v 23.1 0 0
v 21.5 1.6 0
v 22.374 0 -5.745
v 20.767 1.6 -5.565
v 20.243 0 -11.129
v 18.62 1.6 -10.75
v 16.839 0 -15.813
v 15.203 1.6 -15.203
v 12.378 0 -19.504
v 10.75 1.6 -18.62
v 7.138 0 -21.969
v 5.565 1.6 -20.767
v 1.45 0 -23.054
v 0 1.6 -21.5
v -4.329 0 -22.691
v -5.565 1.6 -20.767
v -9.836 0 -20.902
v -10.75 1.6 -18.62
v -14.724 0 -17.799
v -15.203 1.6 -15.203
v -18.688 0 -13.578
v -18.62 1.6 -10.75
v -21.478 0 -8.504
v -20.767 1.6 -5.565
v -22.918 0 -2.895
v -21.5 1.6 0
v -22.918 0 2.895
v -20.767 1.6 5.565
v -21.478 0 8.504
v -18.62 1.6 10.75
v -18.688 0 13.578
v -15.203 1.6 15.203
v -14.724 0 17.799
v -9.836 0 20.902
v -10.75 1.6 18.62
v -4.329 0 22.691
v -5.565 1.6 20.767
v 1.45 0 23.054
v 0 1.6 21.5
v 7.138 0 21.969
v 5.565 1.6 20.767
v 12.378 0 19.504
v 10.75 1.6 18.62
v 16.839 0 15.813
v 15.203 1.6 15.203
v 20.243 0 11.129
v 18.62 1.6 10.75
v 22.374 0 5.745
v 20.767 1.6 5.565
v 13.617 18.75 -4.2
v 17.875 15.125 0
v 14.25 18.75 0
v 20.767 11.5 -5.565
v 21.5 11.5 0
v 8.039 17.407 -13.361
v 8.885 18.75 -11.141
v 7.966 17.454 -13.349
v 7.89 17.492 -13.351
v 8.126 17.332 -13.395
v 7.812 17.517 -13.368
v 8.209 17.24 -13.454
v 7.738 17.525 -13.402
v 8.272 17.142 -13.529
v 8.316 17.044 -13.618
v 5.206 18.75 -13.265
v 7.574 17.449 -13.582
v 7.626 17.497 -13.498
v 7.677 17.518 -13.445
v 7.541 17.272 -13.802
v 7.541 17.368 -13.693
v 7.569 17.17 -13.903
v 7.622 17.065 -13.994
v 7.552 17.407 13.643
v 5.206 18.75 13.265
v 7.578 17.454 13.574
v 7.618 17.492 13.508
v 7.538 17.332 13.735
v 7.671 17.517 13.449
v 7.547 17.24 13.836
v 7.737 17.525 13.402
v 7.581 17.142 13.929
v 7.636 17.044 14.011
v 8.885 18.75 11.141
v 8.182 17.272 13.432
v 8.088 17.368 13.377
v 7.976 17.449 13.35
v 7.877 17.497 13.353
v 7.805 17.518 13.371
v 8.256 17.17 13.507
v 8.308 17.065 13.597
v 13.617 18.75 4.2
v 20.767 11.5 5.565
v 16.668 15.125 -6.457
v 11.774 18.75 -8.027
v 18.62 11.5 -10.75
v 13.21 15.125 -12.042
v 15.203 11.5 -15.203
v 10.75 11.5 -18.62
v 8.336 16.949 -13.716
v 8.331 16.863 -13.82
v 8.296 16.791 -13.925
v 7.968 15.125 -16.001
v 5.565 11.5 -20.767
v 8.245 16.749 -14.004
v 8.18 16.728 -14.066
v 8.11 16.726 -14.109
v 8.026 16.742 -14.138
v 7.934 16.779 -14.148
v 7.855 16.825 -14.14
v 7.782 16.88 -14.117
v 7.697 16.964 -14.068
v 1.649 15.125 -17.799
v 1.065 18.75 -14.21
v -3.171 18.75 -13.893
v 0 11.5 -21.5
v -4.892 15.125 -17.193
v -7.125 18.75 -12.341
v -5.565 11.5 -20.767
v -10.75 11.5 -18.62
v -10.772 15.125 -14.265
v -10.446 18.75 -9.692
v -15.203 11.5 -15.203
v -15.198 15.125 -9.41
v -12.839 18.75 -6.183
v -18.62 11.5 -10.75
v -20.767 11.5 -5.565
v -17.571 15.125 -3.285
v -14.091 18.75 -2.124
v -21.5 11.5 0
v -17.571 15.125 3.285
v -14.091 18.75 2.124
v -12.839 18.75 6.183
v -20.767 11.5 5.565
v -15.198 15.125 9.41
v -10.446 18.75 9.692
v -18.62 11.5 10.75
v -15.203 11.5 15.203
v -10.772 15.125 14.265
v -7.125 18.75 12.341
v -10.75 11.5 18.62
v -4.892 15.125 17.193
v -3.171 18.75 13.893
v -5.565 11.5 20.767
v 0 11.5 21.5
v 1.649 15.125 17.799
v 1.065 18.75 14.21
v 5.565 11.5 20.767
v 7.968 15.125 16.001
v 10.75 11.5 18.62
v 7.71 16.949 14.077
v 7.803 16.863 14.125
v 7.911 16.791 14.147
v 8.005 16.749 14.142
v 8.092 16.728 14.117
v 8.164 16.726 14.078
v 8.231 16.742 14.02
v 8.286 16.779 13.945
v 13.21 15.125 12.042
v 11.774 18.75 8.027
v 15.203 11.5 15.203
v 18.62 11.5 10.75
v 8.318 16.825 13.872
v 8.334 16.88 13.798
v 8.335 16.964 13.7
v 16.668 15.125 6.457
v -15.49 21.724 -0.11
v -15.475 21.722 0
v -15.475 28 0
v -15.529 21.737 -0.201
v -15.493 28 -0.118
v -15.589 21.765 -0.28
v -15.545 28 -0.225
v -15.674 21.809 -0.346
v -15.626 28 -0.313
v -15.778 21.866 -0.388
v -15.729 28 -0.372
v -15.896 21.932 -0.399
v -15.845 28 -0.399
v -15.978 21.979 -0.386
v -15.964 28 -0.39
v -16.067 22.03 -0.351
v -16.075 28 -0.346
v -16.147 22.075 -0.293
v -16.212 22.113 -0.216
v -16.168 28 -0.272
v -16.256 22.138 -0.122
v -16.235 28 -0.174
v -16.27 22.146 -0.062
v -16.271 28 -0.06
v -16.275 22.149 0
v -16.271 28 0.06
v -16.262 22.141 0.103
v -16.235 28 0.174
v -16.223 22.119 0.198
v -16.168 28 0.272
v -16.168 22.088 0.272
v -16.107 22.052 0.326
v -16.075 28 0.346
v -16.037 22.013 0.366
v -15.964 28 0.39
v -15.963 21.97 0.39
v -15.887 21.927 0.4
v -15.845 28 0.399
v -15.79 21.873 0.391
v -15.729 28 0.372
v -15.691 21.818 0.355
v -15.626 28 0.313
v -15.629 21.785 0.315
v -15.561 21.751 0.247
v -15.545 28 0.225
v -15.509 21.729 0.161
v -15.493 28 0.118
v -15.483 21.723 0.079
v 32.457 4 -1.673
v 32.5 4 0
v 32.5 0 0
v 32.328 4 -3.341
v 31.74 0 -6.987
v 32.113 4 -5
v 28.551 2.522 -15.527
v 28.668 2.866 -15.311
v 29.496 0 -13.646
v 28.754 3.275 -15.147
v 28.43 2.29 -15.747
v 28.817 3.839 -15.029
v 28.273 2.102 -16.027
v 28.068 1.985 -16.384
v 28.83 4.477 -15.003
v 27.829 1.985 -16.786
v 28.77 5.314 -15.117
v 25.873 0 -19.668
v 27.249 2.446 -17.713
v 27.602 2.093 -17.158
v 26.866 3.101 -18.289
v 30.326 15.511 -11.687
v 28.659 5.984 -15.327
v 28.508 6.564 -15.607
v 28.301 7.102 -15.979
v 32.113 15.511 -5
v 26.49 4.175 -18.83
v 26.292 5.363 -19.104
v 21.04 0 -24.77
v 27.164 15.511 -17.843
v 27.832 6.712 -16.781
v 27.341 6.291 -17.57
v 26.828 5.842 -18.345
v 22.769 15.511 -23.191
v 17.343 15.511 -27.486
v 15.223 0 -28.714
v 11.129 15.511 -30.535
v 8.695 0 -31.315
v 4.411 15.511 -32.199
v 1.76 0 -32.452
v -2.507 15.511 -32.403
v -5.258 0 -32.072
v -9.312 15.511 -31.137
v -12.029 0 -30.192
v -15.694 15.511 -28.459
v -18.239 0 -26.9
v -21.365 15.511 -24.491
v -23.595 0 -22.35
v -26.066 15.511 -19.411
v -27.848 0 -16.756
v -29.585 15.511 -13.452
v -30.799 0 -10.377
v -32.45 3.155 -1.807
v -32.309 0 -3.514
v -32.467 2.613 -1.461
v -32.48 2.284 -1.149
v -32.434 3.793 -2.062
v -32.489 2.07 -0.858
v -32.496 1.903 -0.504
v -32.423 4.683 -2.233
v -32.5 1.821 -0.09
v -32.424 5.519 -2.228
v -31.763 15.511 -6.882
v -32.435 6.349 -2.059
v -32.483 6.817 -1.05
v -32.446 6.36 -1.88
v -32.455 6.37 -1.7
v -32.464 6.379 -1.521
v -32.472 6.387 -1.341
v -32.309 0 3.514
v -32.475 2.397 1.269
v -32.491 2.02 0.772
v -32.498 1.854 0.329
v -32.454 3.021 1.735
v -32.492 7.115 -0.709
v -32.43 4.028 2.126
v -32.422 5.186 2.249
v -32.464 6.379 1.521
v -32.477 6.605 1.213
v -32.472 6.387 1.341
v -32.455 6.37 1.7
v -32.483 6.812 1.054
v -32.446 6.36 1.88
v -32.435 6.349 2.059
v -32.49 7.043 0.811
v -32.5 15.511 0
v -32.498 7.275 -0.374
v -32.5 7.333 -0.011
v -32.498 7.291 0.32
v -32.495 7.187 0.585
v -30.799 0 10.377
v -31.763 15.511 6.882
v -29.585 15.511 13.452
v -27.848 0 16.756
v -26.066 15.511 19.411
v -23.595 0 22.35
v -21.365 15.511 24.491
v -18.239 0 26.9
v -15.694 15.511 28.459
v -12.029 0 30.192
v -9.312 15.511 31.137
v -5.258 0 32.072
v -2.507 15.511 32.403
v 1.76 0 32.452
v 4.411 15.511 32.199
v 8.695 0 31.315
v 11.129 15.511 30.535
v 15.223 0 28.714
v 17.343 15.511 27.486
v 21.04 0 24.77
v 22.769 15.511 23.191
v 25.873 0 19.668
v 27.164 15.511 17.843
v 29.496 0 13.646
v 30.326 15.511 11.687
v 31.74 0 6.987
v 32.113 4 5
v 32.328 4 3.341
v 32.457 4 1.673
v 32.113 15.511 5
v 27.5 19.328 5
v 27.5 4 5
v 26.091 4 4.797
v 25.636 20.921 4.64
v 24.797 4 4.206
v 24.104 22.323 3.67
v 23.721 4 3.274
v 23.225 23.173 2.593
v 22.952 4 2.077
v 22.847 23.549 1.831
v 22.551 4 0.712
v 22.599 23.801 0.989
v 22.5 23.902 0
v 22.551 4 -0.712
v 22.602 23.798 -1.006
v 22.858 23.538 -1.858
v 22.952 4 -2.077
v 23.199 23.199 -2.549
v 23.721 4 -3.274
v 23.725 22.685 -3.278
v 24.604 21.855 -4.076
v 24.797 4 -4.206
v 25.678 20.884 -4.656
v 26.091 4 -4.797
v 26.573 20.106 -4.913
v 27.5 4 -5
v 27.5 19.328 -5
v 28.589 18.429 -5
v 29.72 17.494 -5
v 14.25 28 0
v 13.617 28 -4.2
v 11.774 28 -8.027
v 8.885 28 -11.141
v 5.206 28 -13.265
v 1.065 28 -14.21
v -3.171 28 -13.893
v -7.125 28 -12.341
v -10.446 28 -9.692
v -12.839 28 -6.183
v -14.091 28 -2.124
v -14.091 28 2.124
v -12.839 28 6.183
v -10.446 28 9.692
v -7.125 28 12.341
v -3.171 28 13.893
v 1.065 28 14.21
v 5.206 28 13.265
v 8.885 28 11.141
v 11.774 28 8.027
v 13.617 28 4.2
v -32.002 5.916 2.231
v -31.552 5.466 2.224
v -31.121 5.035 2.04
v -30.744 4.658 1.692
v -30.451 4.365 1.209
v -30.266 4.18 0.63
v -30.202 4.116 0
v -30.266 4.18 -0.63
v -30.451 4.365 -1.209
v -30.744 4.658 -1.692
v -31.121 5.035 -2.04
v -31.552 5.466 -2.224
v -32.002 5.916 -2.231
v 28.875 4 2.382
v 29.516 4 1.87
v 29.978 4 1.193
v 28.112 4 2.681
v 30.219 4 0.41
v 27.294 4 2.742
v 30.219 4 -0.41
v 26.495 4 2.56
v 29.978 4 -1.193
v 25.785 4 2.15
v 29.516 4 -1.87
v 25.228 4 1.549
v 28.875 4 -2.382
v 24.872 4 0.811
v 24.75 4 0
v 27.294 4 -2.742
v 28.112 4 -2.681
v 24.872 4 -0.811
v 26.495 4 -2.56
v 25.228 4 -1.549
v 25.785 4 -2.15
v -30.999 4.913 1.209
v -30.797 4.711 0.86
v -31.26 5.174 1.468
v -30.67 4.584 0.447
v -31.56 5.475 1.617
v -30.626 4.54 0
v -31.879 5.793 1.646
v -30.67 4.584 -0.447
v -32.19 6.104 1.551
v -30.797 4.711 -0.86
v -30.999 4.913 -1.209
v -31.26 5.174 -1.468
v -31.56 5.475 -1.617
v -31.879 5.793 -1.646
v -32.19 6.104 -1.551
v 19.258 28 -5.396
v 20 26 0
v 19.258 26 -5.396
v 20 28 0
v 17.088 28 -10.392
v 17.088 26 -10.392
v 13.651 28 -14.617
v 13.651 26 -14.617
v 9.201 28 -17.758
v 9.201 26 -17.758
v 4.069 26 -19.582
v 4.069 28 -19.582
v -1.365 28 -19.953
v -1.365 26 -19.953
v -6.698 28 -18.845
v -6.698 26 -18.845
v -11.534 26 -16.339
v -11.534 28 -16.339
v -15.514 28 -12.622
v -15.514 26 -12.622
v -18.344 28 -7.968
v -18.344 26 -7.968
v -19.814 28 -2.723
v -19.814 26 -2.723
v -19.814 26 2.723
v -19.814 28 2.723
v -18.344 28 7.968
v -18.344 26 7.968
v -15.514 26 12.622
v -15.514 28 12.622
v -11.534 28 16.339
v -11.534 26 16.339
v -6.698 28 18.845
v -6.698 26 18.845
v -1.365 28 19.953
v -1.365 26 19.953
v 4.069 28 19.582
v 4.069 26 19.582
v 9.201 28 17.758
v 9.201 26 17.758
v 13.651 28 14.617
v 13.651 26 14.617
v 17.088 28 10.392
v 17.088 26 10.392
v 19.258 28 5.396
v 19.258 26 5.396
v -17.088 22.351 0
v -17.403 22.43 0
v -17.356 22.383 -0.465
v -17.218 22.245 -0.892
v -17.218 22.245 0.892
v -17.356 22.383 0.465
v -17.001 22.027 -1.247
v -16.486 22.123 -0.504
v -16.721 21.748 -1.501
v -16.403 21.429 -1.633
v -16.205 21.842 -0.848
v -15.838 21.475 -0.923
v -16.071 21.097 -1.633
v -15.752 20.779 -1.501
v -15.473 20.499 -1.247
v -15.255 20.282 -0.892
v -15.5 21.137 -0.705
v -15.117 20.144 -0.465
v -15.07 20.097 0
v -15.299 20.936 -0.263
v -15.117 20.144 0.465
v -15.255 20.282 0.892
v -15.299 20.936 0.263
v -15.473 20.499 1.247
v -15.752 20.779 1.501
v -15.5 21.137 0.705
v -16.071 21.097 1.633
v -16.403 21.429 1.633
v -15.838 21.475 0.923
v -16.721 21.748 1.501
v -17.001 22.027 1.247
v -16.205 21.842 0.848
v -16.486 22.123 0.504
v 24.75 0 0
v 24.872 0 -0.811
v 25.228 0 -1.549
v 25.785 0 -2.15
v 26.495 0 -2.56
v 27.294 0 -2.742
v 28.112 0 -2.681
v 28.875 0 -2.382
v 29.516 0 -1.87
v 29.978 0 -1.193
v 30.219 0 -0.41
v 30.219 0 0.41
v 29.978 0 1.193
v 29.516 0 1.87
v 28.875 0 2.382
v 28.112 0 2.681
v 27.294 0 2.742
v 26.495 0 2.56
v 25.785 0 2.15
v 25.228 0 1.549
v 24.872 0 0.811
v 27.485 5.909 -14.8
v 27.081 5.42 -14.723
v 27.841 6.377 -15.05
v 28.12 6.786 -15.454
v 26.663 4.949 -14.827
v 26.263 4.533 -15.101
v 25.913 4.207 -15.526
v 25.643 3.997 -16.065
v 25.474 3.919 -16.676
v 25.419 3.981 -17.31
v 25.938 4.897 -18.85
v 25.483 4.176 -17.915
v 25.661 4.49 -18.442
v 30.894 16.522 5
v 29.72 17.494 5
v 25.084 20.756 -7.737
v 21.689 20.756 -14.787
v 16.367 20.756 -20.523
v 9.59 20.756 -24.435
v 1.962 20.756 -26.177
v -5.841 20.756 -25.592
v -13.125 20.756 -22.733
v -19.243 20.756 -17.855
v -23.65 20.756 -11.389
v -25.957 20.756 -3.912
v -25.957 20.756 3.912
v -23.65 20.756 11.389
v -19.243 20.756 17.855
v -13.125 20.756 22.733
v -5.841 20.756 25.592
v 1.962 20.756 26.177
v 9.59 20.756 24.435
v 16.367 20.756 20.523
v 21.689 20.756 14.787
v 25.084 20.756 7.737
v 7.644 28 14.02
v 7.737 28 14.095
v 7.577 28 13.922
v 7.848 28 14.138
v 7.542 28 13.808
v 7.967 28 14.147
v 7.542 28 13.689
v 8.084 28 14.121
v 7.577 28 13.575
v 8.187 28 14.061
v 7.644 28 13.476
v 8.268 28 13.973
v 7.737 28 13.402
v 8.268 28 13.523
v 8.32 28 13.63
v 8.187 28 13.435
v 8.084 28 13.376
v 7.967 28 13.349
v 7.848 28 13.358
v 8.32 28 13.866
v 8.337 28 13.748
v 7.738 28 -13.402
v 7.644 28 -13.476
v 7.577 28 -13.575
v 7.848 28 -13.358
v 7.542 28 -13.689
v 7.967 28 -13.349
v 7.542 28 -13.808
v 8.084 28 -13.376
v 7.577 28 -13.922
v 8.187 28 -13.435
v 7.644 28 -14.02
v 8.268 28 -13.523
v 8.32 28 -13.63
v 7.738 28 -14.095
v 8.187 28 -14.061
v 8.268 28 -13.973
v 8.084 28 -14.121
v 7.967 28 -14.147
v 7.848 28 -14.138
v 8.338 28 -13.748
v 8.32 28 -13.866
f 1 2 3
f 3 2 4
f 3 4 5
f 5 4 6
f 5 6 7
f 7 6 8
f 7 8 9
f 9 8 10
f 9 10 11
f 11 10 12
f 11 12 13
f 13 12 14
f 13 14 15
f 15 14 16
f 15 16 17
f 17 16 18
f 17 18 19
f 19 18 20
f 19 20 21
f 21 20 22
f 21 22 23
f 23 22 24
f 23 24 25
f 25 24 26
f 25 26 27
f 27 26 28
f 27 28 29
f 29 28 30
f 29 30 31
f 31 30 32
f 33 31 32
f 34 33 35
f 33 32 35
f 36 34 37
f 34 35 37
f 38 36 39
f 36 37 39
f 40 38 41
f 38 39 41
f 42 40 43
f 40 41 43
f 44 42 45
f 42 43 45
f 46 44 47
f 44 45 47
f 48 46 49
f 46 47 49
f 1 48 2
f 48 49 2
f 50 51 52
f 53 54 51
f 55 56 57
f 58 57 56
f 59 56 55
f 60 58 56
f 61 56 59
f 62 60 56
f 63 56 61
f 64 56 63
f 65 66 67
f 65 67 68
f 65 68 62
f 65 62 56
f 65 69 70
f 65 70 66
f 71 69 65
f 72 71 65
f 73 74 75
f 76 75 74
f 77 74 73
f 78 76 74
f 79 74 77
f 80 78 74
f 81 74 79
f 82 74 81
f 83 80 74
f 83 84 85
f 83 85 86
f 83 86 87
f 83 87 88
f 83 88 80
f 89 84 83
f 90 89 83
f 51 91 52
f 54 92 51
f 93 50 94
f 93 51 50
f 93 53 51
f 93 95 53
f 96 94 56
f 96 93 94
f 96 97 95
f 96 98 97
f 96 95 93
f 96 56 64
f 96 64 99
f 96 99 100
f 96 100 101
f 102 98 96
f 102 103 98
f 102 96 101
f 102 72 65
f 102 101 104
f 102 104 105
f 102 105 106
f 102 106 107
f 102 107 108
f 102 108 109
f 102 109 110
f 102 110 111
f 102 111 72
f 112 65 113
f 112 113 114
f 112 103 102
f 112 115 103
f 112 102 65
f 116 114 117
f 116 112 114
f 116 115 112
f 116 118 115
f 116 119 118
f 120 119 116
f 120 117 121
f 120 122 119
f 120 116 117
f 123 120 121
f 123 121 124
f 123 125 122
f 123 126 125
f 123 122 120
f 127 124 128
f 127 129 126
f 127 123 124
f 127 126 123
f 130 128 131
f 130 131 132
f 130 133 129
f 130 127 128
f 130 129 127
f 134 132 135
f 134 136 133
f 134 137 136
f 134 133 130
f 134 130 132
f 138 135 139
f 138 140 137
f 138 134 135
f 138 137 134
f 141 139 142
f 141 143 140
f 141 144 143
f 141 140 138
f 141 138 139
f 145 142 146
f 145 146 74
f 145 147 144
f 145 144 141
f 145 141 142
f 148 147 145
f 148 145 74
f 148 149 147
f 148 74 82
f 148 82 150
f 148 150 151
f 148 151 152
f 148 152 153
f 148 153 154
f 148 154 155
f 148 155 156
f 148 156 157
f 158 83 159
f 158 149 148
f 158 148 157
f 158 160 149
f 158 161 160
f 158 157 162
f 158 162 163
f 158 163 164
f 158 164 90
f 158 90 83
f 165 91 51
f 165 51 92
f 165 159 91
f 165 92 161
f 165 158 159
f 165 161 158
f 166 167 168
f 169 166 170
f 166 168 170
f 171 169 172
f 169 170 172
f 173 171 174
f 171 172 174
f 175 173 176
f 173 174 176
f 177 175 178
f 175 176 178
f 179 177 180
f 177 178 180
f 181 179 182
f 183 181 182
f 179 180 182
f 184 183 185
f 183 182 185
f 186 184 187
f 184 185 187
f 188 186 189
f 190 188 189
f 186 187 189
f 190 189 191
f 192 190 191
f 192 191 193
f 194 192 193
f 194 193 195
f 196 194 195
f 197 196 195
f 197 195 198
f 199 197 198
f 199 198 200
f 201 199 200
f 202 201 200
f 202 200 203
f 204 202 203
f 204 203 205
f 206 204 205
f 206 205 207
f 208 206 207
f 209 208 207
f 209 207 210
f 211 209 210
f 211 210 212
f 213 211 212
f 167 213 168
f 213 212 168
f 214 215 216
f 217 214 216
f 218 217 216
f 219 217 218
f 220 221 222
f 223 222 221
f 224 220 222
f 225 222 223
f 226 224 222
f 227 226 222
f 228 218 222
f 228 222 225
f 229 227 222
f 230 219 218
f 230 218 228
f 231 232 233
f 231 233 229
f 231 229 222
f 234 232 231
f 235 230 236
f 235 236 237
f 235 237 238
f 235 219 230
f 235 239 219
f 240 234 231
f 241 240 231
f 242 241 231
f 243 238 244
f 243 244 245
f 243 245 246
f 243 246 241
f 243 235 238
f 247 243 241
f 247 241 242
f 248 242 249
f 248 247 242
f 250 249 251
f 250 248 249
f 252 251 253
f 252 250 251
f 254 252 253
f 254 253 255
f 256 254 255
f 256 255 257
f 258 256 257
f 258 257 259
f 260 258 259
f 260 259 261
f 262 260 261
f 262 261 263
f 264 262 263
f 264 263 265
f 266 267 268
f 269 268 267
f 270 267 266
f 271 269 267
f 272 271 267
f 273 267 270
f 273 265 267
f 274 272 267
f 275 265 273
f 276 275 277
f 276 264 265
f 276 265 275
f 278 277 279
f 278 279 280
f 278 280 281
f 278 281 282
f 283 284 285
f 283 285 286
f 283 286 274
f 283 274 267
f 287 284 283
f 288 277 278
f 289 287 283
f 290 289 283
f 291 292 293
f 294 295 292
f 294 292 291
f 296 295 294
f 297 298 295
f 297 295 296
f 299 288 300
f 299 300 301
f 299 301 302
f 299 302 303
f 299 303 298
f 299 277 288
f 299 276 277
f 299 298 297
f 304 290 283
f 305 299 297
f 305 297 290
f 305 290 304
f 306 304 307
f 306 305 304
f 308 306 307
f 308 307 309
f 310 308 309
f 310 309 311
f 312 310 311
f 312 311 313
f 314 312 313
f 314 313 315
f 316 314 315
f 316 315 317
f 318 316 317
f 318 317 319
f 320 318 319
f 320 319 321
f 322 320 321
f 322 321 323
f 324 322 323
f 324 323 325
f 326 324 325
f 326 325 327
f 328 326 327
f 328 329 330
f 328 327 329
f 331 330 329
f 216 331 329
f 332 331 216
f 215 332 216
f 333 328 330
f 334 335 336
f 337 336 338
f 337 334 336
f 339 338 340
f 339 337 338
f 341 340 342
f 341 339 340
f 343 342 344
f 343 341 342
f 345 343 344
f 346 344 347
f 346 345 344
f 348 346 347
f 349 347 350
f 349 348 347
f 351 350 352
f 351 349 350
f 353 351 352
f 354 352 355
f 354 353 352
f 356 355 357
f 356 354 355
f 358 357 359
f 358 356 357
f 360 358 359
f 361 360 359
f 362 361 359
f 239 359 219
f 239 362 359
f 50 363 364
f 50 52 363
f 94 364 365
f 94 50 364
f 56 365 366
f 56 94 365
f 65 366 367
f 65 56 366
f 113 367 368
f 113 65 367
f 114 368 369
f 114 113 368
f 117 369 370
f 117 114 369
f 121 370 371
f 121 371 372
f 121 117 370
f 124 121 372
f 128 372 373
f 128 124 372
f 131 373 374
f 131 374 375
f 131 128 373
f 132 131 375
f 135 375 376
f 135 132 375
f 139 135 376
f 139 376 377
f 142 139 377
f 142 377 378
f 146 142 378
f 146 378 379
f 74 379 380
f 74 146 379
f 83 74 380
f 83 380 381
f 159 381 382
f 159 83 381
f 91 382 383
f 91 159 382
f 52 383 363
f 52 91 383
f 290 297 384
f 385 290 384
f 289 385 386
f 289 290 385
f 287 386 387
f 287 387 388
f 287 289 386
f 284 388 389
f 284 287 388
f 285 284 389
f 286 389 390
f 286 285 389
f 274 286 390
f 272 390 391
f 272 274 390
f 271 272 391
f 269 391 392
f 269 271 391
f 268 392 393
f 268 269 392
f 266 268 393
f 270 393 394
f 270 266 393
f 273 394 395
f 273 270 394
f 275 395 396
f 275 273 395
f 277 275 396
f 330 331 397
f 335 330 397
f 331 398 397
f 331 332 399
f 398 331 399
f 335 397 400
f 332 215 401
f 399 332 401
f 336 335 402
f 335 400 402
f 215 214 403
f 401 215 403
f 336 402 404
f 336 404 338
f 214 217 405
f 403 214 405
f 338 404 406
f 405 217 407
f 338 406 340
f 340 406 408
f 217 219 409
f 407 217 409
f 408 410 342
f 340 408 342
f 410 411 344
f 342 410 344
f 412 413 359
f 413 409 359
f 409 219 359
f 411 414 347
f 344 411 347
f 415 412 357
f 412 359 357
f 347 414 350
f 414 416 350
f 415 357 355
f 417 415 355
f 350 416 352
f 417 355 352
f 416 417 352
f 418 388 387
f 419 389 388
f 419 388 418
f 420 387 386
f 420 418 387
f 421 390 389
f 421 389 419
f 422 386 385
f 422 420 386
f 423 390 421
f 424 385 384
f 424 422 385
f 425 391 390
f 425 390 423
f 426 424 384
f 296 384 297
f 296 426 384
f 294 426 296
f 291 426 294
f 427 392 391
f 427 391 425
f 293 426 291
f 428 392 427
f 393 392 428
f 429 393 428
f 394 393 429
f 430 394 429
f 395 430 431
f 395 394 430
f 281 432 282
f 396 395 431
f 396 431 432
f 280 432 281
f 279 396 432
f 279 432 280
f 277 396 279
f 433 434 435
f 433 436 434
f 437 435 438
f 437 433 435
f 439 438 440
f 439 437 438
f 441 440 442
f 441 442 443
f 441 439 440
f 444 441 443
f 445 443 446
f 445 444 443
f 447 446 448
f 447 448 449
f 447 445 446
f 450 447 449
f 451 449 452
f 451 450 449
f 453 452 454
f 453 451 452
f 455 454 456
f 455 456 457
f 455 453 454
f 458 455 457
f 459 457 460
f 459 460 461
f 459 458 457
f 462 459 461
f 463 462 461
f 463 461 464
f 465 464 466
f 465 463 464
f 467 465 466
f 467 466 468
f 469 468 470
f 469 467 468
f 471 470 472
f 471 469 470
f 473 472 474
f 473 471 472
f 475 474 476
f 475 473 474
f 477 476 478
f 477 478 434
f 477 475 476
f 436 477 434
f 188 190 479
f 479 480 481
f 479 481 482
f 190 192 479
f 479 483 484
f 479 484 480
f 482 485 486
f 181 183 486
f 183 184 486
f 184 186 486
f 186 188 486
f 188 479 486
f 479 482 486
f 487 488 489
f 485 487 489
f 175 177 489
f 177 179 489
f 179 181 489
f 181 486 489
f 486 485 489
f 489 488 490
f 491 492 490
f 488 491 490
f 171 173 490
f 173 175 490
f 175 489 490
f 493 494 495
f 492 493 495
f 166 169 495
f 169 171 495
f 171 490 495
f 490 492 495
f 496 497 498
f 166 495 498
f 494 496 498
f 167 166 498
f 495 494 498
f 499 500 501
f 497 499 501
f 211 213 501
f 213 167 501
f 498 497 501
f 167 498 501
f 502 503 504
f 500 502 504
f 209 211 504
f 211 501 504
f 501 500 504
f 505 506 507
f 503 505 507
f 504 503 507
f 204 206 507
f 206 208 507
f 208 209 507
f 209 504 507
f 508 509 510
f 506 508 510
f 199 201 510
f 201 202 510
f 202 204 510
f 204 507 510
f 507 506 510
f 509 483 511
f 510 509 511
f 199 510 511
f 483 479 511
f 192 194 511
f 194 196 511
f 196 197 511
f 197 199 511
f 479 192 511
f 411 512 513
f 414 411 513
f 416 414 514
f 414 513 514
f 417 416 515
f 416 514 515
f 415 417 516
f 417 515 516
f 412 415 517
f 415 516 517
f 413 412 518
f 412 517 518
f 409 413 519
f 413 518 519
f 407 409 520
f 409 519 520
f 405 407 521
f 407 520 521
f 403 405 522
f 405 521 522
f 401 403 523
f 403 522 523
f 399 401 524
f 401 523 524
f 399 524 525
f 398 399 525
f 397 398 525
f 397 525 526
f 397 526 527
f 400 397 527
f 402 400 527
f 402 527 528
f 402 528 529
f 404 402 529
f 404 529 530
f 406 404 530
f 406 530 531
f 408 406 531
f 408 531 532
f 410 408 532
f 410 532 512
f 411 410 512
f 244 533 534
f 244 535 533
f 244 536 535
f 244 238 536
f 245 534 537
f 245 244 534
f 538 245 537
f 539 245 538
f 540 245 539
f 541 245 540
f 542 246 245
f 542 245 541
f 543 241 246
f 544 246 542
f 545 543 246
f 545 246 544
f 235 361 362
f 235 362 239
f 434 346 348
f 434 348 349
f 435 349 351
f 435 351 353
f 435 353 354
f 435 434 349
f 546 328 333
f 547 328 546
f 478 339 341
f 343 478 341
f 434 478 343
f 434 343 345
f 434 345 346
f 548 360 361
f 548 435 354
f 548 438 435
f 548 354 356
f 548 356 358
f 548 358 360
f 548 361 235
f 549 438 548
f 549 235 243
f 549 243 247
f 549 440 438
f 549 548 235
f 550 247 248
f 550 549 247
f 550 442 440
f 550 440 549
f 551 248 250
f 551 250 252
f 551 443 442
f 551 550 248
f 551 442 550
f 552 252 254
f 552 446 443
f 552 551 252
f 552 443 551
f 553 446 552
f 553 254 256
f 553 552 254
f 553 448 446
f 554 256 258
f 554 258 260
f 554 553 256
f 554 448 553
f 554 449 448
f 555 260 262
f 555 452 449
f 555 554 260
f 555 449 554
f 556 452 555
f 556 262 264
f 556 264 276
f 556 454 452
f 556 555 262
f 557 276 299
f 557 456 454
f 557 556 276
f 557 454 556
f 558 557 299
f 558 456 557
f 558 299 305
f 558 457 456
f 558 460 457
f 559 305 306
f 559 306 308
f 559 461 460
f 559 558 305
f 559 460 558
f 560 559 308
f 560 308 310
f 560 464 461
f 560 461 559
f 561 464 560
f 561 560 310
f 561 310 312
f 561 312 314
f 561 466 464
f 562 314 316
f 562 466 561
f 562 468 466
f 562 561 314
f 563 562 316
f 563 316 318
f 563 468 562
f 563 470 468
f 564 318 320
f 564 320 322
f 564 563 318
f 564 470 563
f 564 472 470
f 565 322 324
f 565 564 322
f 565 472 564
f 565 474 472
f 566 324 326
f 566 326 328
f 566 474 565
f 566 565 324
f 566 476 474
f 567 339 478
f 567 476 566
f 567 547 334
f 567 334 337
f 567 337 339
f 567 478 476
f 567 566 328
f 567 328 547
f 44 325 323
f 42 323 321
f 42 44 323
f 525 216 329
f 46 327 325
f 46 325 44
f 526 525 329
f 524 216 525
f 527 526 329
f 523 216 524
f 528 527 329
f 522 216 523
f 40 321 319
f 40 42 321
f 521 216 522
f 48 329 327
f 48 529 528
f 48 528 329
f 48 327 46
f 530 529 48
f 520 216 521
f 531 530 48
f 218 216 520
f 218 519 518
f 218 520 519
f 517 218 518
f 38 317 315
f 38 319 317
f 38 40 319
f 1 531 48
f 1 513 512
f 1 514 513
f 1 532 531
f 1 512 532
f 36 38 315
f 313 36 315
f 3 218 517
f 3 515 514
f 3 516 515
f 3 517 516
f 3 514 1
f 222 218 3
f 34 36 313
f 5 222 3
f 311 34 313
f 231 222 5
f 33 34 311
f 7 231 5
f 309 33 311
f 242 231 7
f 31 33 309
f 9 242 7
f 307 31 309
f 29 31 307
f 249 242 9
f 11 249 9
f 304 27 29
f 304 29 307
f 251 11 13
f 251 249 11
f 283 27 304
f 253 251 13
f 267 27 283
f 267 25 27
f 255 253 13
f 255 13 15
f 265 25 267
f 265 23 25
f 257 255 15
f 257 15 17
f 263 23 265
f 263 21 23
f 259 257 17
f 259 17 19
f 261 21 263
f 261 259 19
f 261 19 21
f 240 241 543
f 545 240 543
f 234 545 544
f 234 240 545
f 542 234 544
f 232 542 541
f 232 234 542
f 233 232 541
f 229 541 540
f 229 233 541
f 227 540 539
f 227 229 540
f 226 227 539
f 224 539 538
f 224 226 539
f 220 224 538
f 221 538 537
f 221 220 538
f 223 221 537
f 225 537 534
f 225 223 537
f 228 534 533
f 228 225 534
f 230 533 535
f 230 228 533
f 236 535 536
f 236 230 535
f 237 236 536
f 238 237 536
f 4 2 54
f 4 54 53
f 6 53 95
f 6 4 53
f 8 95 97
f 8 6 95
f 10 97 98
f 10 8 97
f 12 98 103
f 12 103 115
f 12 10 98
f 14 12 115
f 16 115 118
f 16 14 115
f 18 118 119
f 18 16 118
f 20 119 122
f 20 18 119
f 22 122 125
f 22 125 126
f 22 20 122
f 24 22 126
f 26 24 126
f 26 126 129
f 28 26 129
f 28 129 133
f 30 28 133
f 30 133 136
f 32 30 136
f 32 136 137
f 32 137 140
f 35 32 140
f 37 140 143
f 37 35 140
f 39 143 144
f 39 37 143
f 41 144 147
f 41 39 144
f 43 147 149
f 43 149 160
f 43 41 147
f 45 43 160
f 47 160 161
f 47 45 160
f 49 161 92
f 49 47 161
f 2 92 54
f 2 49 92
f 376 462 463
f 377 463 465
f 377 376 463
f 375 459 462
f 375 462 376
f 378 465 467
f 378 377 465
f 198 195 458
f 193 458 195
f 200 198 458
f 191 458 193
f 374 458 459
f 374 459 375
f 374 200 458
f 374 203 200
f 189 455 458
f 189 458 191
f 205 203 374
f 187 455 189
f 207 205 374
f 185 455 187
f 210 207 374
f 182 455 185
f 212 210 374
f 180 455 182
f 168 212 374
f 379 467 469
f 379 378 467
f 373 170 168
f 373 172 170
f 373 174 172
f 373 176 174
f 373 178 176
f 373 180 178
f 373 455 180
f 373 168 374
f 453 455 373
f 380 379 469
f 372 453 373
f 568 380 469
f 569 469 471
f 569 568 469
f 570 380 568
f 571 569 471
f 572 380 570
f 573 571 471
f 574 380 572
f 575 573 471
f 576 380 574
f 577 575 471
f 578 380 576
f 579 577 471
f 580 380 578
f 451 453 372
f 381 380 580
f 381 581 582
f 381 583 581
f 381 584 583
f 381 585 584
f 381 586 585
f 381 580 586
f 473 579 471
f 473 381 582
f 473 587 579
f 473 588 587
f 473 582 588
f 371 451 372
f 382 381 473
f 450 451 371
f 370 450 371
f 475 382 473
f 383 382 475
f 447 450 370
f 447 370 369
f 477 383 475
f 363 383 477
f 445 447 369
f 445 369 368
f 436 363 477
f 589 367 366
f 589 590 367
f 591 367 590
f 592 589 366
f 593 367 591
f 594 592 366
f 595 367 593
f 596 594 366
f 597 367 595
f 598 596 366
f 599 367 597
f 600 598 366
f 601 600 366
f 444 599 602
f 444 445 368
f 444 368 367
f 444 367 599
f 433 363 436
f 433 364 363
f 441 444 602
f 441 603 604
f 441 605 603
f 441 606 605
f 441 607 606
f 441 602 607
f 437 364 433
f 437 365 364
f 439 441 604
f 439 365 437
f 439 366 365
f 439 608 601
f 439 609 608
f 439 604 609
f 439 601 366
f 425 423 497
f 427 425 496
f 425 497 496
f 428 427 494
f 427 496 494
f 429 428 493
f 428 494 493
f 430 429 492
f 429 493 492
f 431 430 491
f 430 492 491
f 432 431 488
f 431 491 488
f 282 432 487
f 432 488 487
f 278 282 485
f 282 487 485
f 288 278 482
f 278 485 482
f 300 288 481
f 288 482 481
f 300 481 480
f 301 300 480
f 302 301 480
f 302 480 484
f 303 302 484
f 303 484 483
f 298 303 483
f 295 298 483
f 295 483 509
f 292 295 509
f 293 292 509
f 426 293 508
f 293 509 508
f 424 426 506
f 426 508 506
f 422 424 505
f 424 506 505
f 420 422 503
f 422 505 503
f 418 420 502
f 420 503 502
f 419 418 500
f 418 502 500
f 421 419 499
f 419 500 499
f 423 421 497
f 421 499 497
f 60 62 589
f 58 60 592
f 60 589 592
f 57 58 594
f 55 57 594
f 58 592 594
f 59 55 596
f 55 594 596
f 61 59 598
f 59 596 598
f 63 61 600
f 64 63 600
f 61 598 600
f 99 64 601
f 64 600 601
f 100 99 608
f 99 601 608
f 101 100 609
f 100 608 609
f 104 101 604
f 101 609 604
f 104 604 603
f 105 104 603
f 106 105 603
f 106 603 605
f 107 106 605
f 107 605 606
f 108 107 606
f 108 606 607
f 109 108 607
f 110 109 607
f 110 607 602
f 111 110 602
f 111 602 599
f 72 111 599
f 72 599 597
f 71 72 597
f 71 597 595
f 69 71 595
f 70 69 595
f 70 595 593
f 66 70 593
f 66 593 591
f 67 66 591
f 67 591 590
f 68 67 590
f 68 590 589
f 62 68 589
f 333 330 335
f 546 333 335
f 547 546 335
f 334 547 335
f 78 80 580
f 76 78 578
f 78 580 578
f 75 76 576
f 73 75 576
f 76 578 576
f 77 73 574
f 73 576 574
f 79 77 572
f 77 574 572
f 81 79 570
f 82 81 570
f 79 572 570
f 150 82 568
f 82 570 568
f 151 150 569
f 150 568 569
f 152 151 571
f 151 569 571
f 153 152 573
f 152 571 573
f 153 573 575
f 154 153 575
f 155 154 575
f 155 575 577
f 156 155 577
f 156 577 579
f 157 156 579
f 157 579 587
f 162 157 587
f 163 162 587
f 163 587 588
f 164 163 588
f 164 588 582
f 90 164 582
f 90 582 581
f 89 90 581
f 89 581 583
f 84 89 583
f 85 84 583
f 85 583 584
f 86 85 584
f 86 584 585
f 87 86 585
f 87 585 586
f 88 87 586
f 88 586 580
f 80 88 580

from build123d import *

# Parameters (mm, degrees)
FASE1_SIZE                            = 1.6
SCHNITT_LINEAR_AUSTRAGEN1_DEPTH       = 24
F_5_5_5_5_DURCHMESSER_BOHRUNG1_D      = 5.5
M4_GEWINDEBOHRUNG2_D                  = 3.3
M4_GEWINDEBOHRUNG2_DEPTH              = 22
M4_GEWINDEBOHRUNG2_TIP                = 0.991420021
F_0_8_0_8_DURCHMESSER_BOHRUNG1_REACH  = 55.819
F_0_8_0_8_DURCHMESSER_BOHRUNG1_BORE_R = 0.4
KREISMUSTER1_COUNT                    = 3


with BuildPart() as part:
    # Skizze1 → Rotation1 (revolve)
    with BuildSketch(Plane.XY):
        Polygon((21.5, 0), (32.5, 0), (32.5, 15.51125461), (20, 26), (20, 28), (14.25, 28), (14.25, 18.75), (21.5, 11.5), align=None)
    revolve(axis=Axis((0, 0, 0), (0, 1, 0)))

    # Fase1
    fase1_edges = [part.edges().sort_by_distance(p)[0] for p in [
        (-21.5, 0, 0),
    ]]
    chamfer(fase1_edges, length=FASE1_SIZE)

    # Skizze2 → Schnitt-Linear austragen1 (cut)
    with BuildSketch(Plane(origin=(0, 28, 0), x_dir=(1, 0, 0), z_dir=(0, 1, 0))):
        with BuildLine():
            Line((27.5, 5), (36.713219287, 5))
            ThreePointArc((36.713219287, 5), (41.713219287, 0), (36.713219287, -5))
            Line((36.713219287, -5), (27.5, -5))
            ThreePointArc((27.5, -5), (22.5, 0), (27.5, 5))
        make_face()
    extrude(amount=-SCHNITT_LINEAR_AUSTRAGEN1_DEPTH, mode=Mode.SUBTRACT)

    # 5.5 _5.5_ Durchmesser Bohrung1 (through all)
    with Locations(Plane(origin=(0, 28, 0), x_dir=(1, 0, 0), z_dir=(0, 1, 0))):
        with Locations((27.5, 0)):
            Hole(F_5_5_5_5_DURCHMESSER_BOHRUNG1_D / 2)

    # Skizze9 → Schnitt-Rotation1 (revolve, cut)
    with BuildSketch(Plane.XY):
        Polygon((-34.391087084, 3.108912916), (-31.792893219, 5.707106781), (-30.201902961, 4.116116524), (-32.800096827, 1.517922658), align=None)
    revolve(axis=Axis((-34.391087084, 3.108912916, 0), (0.7071067811865462, 0.7071067811865488, 0)), mode=Mode.SUBTRACT)

    # M4 Gewindebohrung2
    with Locations(Plane(origin=(-13.042893219, -13.042893219, 0), x_dir=(-0.7071067811865488, 0.7071067811865462, 0), z_dir=(-0.7071067811865462, -0.7071067811865488, 0))):
        with Locations((26.516504294, 0)):
            Hole(M4_GEWINDEBOHRUNG2_D / 2, depth=M4_GEWINDEBOHRUNG2_DEPTH)
            with Locations((0, 0, -(M4_GEWINDEBOHRUNG2_DEPTH + M4_GEWINDEBOHRUNG2_TIP / 2))):  # 118° drill point
                Cone(0, M4_GEWINDEBOHRUNG2_D / 2, M4_GEWINDEBOHRUNG2_TIP, mode=Mode.SUBTRACT)

    # 0.8 _0.8_ Durchmesser Bohrung1 bore → 0.8 _0.8_ Durchmesser Bohrung1 (cut, up to next)
    with BuildSketch(Plane(origin=(0, 28, 0), x_dir=(1, 0, 0), z_dir=(0, 1, 0)), mode=Mode.PRIVATE) as f_0_8_0_8_durchmesser_bohrung1_sk1:
        with Locations((-15.875, 0)):
            Circle(F_0_8_0_8_DURCHMESSER_BOHRUNG1_BORE_R)
    f_0_8_0_8_durchmesser_bohrung1_tool1 = extrude(f_0_8_0_8_durchmesser_bohrung1_sk1.sketch, amount=-F_0_8_0_8_DURCHMESSER_BOHRUNG1_REACH, mode=Mode.PRIVATE) & part.part
    f_0_8_0_8_durchmesser_bohrung1 = f_0_8_0_8_durchmesser_bohrung1_tool1.solids().sort_by_distance((-15.875, 28, 0))[0]
    add(f_0_8_0_8_durchmesser_bohrung1, mode=Mode.SUBTRACT)

    # Kreismuster1: 0.8 _0.8_ Durchmesser Bohrung1; each copy of 0.8 _0.8_ Durchmesser Bohrung1 runs up to whatever stops it at its own place
    kreismuster1_before = part.part  # the part as the pattern finds it: every copy runs up to it
    kreismuster1_f_0_8_0_8_durchmesser_bohrung1_long = extrude(f_0_8_0_8_durchmesser_bohrung1_sk1.sketch, amount=-F_0_8_0_8_DURCHMESSER_BOHRUNG1_REACH, mode=Mode.PRIVATE)
    kreismuster1_f_0_8_0_8_durchmesser_bohrung1_tool = kreismuster1_f_0_8_0_8_durchmesser_bohrung1_long.rotate(Axis((0, 0, 0), (0, 1, 0)), 1 * 360 / KREISMUSTER1_COUNT) & kreismuster1_before
    add(kreismuster1_f_0_8_0_8_durchmesser_bohrung1_tool.solids().sort_by_distance((7.9375, 28, 13.748153))[0], mode=Mode.SUBTRACT)
    kreismuster1_f_0_8_0_8_durchmesser_bohrung1_tool = kreismuster1_f_0_8_0_8_durchmesser_bohrung1_long.rotate(Axis((0, 0, 0), (0, 1, 0)), 2 * 360 / KREISMUSTER1_COUNT) & kreismuster1_before
    add(kreismuster1_f_0_8_0_8_durchmesser_bohrung1_tool.solids().sort_by_distance((7.9375, 28, -13.748153))[0], mode=Mode.SUBTRACT)

    # Skizze15 → Schnitt-Rotation2 (revolve, cut)
    with BuildSketch(Plane(origin=(-2.039898254, 0, -12.060602687), x_dir=(0, 1, 0), z_dir=(0.16676874671610264, 0, 0.9859960370705049))):
        Polygon((3.231062719, -32.218445859), (5.64278761, -29.344264057), (7.366387607, -30.790536178), (4.954662716, -33.664717981), align=None)
    revolve(axis=Axis((29.727361684, 3.231062719, -17.433632524), (-0.7553167851351978, 0.6427876096865349, 0.12775227170778738)), mode=Mode.SUBTRACT)


solid = part.part
